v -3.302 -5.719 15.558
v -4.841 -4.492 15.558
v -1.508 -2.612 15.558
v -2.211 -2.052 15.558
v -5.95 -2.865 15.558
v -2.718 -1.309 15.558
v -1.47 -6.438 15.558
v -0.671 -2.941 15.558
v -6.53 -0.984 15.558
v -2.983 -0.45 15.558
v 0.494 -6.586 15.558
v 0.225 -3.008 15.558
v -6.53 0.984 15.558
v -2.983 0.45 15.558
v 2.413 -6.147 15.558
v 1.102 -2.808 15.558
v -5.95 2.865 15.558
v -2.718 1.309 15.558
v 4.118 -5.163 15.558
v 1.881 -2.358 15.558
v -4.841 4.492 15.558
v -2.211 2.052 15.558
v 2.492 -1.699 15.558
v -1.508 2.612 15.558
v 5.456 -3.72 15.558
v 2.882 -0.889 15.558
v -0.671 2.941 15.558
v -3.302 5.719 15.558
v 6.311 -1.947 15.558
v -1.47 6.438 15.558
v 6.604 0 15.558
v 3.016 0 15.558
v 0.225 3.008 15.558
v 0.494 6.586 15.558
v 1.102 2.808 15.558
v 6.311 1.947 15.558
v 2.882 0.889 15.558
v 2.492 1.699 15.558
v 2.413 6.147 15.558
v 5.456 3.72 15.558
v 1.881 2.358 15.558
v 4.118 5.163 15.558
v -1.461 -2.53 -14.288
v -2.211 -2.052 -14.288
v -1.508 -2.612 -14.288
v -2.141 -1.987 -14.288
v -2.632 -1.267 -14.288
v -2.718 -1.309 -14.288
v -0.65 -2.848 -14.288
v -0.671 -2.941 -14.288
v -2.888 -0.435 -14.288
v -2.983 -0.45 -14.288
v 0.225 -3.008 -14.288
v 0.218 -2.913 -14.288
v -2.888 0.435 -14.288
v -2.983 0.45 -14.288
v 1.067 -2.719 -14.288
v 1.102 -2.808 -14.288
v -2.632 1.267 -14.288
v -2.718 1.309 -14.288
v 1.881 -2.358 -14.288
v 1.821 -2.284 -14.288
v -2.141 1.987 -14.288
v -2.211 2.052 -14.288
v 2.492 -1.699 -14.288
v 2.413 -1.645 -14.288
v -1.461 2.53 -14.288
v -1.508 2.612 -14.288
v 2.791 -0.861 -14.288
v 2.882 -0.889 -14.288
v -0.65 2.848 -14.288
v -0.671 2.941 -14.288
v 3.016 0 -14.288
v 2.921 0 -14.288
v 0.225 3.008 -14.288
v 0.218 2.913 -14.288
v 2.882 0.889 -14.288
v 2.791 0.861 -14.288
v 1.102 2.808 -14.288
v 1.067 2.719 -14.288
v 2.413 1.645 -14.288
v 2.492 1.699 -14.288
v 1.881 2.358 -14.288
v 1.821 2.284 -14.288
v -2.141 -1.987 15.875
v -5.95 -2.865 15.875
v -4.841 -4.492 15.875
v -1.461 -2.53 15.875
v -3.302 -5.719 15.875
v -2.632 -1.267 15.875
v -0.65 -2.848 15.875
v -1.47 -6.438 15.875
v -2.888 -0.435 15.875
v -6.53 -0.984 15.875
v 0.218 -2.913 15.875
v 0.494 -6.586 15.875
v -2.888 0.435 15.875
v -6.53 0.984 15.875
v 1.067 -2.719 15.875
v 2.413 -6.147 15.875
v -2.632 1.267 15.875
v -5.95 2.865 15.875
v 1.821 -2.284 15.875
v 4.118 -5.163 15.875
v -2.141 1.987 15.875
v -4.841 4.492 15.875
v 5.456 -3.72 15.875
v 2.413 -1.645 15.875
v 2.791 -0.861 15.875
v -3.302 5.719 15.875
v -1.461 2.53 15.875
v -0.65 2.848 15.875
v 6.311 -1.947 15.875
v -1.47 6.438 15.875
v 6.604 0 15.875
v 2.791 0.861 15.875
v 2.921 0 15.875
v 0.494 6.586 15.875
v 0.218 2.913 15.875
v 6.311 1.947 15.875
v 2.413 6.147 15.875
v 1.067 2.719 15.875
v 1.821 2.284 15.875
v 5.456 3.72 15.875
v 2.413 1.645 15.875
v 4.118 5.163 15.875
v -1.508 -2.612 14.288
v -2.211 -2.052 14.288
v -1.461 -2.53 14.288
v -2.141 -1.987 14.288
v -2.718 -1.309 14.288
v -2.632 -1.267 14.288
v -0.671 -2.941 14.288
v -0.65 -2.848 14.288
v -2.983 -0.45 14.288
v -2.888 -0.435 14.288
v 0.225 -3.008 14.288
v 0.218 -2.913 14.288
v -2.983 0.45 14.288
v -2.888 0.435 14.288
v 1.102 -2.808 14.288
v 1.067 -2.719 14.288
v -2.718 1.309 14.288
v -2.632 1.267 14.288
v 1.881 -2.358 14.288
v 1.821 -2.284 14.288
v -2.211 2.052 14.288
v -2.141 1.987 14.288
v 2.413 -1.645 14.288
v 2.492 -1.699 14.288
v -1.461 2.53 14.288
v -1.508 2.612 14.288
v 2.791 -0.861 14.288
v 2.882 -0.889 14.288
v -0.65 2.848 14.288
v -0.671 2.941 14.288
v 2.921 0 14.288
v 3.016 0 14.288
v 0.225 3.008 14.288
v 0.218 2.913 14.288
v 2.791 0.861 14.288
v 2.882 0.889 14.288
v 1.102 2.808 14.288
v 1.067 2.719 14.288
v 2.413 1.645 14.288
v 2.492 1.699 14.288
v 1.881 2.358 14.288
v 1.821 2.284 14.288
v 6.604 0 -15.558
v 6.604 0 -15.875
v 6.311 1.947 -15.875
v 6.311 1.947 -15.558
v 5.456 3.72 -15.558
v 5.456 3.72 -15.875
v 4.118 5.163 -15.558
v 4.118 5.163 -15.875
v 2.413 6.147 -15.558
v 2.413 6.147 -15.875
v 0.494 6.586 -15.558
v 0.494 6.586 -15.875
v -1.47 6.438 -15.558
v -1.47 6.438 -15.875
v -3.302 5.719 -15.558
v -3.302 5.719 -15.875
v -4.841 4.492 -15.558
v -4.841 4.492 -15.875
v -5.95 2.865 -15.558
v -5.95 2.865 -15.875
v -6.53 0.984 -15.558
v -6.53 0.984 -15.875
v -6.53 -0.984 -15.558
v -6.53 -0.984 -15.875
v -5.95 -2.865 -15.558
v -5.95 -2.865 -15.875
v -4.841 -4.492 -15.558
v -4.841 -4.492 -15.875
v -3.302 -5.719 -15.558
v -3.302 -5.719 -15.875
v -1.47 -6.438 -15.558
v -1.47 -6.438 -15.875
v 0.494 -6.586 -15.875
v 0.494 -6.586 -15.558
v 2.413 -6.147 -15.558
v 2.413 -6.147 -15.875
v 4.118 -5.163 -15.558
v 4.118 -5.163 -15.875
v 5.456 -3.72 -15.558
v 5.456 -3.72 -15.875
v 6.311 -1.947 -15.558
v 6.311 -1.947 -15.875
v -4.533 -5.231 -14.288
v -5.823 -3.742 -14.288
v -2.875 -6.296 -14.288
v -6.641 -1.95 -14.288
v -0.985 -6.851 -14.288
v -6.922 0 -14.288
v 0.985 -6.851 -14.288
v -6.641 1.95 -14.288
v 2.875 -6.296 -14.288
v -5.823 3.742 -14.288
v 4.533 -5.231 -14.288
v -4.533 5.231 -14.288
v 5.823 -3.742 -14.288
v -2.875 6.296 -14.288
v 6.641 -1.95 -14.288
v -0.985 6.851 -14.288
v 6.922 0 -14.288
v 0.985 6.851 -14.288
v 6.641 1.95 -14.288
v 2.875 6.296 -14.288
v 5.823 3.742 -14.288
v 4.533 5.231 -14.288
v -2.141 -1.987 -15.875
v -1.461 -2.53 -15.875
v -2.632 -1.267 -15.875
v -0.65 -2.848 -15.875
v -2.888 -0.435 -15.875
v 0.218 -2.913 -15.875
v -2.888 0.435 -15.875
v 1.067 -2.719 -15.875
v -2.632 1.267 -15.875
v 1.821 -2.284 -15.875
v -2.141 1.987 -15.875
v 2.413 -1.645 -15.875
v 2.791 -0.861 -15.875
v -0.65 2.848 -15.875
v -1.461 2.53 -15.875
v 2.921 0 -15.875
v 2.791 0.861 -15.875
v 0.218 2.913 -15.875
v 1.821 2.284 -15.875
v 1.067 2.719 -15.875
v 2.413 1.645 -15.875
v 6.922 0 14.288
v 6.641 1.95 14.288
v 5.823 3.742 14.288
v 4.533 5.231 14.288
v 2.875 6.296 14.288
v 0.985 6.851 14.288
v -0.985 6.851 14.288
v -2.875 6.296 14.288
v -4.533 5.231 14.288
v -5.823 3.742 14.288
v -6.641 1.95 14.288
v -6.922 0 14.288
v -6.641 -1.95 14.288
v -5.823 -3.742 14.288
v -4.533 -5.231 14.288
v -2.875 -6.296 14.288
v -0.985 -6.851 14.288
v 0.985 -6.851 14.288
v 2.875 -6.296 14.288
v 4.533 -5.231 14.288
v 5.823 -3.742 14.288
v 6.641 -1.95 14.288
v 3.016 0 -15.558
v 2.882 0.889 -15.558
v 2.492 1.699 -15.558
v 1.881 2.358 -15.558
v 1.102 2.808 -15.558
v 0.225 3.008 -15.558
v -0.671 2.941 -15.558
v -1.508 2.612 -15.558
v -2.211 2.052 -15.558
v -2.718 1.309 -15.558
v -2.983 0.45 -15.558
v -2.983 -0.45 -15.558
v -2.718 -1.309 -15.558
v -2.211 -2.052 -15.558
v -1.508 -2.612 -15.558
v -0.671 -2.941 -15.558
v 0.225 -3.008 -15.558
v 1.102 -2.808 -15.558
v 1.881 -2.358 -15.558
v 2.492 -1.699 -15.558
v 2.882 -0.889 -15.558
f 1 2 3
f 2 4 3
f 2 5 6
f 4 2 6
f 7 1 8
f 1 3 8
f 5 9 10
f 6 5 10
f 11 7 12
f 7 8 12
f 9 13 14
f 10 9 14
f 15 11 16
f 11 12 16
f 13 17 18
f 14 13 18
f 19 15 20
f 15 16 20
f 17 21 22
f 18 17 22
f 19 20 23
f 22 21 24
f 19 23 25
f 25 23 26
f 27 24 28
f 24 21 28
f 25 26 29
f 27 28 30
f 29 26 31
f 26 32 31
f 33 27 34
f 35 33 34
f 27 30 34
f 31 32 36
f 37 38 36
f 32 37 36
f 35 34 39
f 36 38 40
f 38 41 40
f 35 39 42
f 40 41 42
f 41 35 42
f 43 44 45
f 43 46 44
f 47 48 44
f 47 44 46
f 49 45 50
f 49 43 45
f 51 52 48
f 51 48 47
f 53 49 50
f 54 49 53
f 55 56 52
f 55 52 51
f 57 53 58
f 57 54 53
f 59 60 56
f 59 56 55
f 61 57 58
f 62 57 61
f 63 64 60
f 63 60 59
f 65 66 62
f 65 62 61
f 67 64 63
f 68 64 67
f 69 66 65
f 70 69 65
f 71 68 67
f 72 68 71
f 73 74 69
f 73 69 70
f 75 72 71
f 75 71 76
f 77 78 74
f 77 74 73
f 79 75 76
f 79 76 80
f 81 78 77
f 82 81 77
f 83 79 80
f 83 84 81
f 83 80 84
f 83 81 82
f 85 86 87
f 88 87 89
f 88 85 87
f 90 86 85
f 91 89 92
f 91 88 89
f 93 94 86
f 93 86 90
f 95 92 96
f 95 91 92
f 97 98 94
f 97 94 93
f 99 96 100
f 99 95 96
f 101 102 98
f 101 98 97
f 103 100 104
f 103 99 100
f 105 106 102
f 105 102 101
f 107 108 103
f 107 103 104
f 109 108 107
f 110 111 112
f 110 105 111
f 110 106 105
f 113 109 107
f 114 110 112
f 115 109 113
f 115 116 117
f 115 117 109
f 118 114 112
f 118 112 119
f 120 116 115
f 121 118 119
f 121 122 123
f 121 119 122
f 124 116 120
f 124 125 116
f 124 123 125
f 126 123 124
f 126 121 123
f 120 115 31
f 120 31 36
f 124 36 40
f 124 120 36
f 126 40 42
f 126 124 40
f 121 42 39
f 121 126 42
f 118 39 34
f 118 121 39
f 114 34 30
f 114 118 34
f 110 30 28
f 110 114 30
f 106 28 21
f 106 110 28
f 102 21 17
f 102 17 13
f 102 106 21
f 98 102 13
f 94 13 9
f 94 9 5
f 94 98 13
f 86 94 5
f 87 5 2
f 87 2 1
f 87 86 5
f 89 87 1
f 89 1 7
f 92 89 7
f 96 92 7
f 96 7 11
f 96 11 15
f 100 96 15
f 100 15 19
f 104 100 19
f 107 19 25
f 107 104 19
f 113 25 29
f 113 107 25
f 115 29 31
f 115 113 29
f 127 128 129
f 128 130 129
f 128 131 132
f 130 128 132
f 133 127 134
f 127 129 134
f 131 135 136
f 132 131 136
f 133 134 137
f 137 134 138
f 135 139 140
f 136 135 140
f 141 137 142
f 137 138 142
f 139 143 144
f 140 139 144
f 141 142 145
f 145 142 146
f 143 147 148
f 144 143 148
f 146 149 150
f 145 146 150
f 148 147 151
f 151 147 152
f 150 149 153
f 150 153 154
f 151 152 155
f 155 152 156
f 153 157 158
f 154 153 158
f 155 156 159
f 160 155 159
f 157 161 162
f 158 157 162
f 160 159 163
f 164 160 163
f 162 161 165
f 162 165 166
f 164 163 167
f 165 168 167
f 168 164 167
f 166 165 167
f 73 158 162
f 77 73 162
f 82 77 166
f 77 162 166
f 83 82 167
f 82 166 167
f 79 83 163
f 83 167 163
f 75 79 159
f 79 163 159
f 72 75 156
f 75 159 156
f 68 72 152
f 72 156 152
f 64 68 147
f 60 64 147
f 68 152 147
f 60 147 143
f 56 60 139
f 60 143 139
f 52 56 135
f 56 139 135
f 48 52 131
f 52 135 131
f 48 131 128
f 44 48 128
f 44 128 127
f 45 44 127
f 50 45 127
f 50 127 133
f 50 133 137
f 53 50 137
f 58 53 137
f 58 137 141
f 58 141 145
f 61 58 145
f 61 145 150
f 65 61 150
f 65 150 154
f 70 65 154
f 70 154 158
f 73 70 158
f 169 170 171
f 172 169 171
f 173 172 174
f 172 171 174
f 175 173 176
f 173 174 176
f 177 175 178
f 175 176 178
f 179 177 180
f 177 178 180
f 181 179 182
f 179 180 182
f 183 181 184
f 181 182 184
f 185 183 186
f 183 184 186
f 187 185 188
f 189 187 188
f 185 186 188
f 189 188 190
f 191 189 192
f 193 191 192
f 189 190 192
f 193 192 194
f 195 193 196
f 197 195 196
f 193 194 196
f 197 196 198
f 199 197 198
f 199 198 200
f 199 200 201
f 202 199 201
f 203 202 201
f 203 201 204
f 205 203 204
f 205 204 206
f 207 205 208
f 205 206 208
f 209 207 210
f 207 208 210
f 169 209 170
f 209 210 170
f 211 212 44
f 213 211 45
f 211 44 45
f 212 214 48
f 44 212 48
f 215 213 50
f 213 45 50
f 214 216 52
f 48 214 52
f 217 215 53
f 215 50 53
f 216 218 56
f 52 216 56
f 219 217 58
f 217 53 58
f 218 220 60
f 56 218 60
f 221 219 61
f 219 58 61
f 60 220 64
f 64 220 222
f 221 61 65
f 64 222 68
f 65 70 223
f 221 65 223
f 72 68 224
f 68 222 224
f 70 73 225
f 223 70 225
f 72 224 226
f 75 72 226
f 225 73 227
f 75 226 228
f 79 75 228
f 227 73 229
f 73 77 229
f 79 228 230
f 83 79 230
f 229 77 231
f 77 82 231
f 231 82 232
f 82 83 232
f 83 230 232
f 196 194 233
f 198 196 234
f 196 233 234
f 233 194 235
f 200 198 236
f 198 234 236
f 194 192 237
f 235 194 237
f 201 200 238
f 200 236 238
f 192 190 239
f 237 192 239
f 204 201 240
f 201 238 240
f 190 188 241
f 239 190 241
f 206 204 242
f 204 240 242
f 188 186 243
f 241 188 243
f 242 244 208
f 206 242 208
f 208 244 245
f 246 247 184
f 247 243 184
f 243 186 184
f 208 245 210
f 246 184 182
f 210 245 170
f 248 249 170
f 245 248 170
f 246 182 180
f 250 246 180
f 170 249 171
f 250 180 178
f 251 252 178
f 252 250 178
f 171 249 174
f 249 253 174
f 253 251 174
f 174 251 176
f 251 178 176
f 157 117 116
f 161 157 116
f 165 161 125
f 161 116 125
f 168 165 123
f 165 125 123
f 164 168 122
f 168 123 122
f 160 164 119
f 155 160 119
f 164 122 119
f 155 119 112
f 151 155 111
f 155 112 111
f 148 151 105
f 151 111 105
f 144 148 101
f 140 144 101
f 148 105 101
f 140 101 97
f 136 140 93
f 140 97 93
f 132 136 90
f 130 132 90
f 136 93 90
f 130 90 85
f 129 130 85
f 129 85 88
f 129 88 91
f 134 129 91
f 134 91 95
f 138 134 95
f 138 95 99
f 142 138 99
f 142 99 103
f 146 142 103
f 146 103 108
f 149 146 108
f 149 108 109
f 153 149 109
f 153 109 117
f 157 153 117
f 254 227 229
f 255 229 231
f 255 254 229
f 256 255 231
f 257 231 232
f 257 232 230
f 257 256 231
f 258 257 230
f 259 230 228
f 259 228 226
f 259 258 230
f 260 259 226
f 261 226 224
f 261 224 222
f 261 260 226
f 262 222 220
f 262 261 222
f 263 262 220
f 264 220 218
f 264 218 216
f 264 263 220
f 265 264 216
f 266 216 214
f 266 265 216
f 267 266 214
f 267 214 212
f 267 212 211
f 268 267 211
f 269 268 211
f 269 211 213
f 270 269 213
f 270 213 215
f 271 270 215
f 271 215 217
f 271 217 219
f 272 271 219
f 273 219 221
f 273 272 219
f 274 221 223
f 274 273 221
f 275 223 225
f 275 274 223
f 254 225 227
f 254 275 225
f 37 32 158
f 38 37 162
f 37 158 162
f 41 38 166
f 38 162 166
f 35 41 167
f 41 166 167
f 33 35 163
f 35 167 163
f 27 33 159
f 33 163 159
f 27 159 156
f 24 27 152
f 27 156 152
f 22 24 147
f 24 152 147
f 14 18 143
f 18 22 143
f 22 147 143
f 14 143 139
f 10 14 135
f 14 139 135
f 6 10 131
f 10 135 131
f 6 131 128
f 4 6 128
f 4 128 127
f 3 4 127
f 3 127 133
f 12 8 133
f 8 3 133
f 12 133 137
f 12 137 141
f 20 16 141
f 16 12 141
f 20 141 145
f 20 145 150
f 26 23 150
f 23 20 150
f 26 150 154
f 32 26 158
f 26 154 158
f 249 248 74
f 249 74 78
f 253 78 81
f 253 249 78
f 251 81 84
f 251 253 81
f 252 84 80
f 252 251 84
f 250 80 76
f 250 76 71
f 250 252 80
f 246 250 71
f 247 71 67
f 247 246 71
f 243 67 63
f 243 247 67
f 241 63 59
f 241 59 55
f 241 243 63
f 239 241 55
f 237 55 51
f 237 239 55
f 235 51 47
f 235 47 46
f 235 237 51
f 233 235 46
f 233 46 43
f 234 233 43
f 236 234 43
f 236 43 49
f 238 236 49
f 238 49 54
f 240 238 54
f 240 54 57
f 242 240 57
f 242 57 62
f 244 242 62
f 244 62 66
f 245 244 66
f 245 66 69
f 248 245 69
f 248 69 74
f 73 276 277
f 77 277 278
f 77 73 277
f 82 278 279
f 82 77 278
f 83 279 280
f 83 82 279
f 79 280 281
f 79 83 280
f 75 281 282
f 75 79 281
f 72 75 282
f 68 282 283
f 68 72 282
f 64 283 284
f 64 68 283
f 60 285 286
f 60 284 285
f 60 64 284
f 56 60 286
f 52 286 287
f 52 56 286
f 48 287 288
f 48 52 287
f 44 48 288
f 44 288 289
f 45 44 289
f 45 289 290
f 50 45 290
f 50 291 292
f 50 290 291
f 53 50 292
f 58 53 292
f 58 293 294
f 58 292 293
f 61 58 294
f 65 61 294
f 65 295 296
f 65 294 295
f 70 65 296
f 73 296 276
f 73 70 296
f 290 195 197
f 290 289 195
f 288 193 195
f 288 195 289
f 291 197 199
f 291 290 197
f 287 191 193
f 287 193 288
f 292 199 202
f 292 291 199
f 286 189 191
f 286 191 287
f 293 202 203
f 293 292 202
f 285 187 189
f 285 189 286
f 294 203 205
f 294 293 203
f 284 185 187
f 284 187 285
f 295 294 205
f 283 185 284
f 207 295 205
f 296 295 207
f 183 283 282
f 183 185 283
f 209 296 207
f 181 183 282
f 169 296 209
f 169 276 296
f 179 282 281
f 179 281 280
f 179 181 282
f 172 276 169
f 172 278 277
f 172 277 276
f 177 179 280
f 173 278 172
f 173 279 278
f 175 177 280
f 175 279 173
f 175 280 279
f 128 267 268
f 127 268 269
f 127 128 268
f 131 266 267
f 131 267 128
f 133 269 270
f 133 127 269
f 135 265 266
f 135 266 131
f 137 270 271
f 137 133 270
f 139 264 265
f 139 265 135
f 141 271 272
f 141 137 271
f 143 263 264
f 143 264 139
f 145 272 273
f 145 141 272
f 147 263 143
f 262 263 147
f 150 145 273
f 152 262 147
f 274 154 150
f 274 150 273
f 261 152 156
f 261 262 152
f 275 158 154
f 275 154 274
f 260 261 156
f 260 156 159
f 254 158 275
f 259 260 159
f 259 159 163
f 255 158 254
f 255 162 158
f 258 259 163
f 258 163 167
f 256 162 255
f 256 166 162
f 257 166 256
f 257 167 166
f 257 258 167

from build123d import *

# Parameters (mm, degrees)
F0_R      = 6.9215
F1_DEPTH  = 14.2875
F2_R      = 3.01625
F3_DEPTH  = 28.576
F4_R      = 3.01625
F5_DEPTH  = 1.5875
F6_T      = -0.3175
F7_R      = 6.604
F8_DEPTH  = 0.3175
F9_R      = 2.921
F10_DEPTH = 25.4


with BuildPart() as f1:
    # F0 (on Top) → F1 (new body, symmetric)
    with BuildSketch(Plane.XY):
        Circle(F0_R)
    extrude(amount=F1_DEPTH, both=True)

    # F2 (on face) → F3 (cut, through all)
    with BuildSketch(Plane.XY.offset(14.2875)):
        Circle(F2_R)
    extrude(amount=-F3_DEPTH, mode=Mode.SUBTRACT)


with BuildPart() as f5:
    # F4 (on face) → F5 (new body)
    with BuildSketch(Plane.XY.offset(14.2875)):
        Circle(F4_R)
    extrude(amount=F5_DEPTH)

    # F6
    f6_openings = [f5.faces().sort_by_distance(p)[0] for p in [
        (0, 0, 15.875),
    ]]
    offset(amount=F6_T, openings=f6_openings)

    # F7 (on face) → F8 (join)
    with BuildSketch(Plane.XY.offset(15.875)):
        Circle(F7_R)
    extrude(amount=-F8_DEPTH)

    # F9 (on face) → F10 (cut)
    with BuildSketch(Plane.XY.offset(15.875)):
        Circle(F9_R)
    extrude(amount=-F10_DEPTH, mode=Mode.SUBTRACT)


with BuildPart() as f11_1:
    # F11: instance of F5
    add(f5.part.mirror(Plane.XY))


solid = Compound([f1.part, f5.part, f11_1.part])
